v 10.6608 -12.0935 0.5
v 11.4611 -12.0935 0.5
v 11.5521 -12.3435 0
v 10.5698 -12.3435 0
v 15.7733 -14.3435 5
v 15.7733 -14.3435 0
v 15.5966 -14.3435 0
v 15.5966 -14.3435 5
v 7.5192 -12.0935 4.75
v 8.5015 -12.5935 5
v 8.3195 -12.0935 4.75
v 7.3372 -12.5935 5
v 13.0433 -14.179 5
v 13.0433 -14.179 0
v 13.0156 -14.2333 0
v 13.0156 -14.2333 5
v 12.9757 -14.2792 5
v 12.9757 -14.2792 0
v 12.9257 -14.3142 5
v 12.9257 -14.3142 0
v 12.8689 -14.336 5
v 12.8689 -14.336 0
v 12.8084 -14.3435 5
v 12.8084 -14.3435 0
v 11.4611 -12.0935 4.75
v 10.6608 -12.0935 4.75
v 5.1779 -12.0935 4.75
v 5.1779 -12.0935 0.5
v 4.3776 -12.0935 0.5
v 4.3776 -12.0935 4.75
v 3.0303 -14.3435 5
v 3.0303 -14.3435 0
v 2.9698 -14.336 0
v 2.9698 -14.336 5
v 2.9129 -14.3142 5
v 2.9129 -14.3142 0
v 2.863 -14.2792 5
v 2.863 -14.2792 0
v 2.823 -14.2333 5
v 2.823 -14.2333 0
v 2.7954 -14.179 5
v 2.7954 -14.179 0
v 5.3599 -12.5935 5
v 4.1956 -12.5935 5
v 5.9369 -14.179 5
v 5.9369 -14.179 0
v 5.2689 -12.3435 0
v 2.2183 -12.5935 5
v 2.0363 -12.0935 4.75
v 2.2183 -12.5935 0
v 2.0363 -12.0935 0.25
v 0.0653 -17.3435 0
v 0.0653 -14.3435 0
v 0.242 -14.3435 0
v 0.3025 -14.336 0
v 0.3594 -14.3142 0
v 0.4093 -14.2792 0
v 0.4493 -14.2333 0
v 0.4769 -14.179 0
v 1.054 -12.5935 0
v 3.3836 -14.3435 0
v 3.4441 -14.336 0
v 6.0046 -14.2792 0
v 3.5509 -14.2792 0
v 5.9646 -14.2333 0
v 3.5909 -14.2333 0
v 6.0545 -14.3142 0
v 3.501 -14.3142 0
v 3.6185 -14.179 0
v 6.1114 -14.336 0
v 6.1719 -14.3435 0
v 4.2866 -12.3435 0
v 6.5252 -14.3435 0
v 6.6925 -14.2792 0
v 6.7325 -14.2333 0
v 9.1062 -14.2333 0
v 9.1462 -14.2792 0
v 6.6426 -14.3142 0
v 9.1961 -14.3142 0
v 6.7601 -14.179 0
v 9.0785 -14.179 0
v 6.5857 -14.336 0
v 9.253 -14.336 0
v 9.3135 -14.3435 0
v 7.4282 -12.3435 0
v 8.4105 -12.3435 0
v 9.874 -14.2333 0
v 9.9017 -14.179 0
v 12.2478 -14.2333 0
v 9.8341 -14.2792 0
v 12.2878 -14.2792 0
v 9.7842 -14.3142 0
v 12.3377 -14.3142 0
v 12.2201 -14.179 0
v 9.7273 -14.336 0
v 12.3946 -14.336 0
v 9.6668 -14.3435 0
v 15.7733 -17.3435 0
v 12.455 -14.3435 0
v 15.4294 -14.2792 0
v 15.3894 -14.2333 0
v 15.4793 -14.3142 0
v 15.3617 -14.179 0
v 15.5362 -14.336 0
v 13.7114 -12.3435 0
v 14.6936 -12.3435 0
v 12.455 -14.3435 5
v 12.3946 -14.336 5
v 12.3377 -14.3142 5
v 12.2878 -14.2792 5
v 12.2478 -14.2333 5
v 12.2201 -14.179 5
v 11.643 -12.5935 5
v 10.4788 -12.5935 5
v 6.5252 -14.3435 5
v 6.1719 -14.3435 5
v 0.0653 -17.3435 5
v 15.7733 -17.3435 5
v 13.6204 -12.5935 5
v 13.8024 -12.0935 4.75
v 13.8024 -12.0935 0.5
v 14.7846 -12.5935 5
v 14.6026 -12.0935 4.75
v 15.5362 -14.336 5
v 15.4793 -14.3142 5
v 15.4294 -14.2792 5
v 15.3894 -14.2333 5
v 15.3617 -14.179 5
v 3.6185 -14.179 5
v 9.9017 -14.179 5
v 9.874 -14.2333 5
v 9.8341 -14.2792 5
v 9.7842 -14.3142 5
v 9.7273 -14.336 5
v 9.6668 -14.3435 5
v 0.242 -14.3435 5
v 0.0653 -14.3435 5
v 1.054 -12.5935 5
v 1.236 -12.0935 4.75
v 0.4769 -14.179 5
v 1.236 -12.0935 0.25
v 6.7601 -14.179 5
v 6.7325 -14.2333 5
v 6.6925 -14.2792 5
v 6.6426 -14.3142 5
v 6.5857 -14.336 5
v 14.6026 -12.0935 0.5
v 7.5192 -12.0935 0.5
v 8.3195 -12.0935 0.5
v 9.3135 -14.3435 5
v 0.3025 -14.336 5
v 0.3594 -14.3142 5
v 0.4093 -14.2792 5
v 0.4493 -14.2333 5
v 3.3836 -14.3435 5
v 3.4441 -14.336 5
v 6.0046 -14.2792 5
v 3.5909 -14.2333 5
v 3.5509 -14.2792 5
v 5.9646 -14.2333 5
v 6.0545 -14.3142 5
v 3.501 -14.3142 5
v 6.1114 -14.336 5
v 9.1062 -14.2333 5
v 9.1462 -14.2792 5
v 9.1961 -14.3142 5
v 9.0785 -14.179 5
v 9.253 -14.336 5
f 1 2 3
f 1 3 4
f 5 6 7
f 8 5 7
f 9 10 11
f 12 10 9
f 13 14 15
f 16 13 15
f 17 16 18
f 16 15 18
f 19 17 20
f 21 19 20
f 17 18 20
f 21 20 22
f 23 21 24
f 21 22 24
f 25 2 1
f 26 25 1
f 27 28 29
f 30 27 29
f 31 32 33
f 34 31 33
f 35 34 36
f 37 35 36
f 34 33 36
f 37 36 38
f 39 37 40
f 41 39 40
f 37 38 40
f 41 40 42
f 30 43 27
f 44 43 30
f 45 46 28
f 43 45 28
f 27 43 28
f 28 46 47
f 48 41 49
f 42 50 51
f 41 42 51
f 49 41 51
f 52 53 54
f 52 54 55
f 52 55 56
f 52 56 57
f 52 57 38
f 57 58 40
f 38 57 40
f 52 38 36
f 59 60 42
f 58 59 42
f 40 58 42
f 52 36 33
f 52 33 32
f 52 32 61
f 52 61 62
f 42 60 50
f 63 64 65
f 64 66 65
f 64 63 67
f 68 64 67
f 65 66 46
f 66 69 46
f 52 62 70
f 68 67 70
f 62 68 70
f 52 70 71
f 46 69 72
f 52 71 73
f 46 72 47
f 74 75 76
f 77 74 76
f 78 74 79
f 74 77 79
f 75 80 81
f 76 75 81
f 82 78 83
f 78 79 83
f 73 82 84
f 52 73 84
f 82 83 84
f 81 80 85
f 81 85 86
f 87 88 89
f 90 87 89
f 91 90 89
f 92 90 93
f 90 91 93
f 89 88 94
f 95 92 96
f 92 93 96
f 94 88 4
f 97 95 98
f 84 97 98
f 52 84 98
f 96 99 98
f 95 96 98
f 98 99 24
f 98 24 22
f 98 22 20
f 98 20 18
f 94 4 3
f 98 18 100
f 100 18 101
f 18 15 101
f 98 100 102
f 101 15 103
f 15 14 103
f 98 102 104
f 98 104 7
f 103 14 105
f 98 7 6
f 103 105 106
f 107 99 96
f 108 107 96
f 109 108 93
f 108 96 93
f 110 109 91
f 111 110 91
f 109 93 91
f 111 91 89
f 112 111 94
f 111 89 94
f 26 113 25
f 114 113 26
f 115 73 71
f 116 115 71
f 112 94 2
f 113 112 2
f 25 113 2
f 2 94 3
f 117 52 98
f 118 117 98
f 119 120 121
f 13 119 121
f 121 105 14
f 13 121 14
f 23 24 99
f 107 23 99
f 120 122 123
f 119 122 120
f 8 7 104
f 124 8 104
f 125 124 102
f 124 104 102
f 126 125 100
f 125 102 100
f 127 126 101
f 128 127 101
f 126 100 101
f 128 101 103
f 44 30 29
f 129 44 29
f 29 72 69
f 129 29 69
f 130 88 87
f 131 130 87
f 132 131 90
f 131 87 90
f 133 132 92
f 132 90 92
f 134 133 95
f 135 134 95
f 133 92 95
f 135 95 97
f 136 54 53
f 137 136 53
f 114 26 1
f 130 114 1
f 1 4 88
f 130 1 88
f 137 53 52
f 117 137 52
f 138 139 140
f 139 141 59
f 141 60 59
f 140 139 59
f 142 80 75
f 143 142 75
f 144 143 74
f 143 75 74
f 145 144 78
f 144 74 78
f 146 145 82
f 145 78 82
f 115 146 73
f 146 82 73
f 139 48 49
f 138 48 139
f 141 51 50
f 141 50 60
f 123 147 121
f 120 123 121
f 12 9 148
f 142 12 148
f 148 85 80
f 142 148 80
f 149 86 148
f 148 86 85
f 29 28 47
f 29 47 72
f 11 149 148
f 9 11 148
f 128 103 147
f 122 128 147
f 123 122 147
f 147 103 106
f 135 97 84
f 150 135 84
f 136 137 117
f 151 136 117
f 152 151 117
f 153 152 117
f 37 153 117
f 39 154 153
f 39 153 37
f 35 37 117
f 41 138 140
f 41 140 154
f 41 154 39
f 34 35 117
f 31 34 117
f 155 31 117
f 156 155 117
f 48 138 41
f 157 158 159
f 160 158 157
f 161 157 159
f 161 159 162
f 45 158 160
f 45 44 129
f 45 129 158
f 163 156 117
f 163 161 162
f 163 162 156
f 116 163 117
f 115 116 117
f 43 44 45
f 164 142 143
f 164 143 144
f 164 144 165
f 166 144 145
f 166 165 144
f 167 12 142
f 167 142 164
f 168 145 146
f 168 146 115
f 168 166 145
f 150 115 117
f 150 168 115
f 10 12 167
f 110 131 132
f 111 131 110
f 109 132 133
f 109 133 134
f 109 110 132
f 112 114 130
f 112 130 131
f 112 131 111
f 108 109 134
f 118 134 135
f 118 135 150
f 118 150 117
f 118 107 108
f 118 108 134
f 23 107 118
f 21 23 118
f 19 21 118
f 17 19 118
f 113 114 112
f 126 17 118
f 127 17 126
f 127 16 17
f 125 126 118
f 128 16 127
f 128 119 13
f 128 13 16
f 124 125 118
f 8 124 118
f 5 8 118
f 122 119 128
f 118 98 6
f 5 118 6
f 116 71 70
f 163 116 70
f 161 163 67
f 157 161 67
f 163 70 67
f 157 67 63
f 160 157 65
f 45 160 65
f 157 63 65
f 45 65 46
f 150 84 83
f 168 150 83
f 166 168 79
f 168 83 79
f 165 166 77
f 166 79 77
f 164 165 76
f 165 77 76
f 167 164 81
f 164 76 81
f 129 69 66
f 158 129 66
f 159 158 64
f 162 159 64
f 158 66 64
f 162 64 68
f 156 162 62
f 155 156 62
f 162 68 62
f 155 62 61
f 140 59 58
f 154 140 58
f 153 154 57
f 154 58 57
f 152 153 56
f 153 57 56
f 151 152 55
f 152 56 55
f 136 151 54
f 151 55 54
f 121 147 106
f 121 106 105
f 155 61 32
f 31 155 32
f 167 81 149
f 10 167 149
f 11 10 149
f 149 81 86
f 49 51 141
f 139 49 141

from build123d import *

# Parameters (mm, degrees)
F1_DEPTH     = 5
F2_C1_SIZE2  = 0.25
F2_C1_SIZE   = 0.5
F2_C2_SIZE2  = 0.5
F2_C2_SIZE   = 0.25
F2_C3_SIZE2  = 0.5
F2_C3_SIZE   = 0.25
F2_C4_SIZE2  = 0.5
F2_C4_SIZE   = 0.25
F2_C5_SIZE2  = 0.25
F2_C5_SIZE   = 0.5
F2_C6_SIZE2  = 0.5
F2_C6_SIZE   = 0.25
F2_C7_SIZE2  = 0.5
F2_C7_SIZE   = 0.25
F2_C8_SIZE2  = 0.5
F2_C8_SIZE   = 0.25
F2_C9_SIZE2  = 0.5
F2_C9_SIZE   = 0.25
F2_C10_SIZE2 = 0.5
F2_C10_SIZE  = 0.25


with BuildPart() as f1:
    # F0 (on Top) → F1 (new body)
    with BuildSketch(Plane.XY):
        with BuildLine():
            Line((1.236000562, -12.0934582279), (0.4769388315, -14.1789632613))
            ThreePointArc((0.4769388315, -14.1789632613), (0.3854097856, -14.2982462382), (0.2420156754, -14.3434582279))
            Line((0.2420156754, -14.3434582279), (0.065349562, -14.3434582279))
            Line((0.065349562, -14.3434582279), (0.065349562, -17.3434582279))
            Line((0.065349562, -17.3434582279), (15.773299562, -17.3434582279))
            Line((15.773299562, -17.3434582279), (15.773299562, -14.3434582279))
            Line((15.773299562, -14.3434582279), (15.5966334485, -14.3434582279))
            ThreePointArc((15.5966334485, -14.3434582279), (15.4532393383, -14.2982462382), (15.3617102924, -14.1789632613))
            Line((15.3617102924, -14.1789632613), (14.602648562, -12.0934582279))
            Line((14.602648562, -12.0934582279), (13.802360562, -12.0934582279))
            Line((13.802360562, -12.0934582279), (13.0432988315, -14.1789632613))
            ThreePointArc((13.0432988315, -14.1789632613), (12.9517697856, -14.2982462382), (12.8083756754, -14.3434582279))
            Line((12.8083756754, -14.3434582279), (12.4550434485, -14.3434582279))
            ThreePointArc((12.4550434485, -14.3434582279), (12.3116493383, -14.2982462382), (12.2201202924, -14.1789632613))
            Line((12.2201202924, -14.1789632613), (11.461058562, -12.0934582279))
            Line((11.461058562, -12.0934582279), (10.660770562, -12.0934582279))
            Line((10.660770562, -12.0934582279), (9.9017088315, -14.1789632613))
            ThreePointArc((9.9017088315, -14.1789632613), (9.8101797856, -14.2982462382), (9.6667856754, -14.3434582279))
            Line((9.6667856754, -14.3434582279), (9.3134534485, -14.3434582279))
            ThreePointArc((9.3134534485, -14.3434582279), (9.1700593383, -14.2982462382), (9.0785302924, -14.1789632613))
            Line((9.0785302924, -14.1789632613), (8.319468562, -12.0934582279))
            Line((8.319468562, -12.0934582279), (7.519180562, -12.0934582279))
            Line((7.519180562, -12.0934582279), (6.7601188315, -14.1789632613))
            ThreePointArc((6.7601188315, -14.1789632613), (6.6685897856, -14.2982462382), (6.5251956754, -14.3434582279))
            Line((6.5251956754, -14.3434582279), (6.1718634485, -14.3434582279))
            ThreePointArc((6.1718634485, -14.3434582279), (6.0284693383, -14.2982462382), (5.9369402924, -14.1789632613))
            Line((5.9369402924, -14.1789632613), (5.177878562, -12.0934582279))
            Line((5.177878562, -12.0934582279), (4.377590562, -12.0934582279))
            Line((4.377590562, -12.0934582279), (3.6185288315, -14.1789632613))
            ThreePointArc((3.6185288315, -14.1789632613), (3.5269997856, -14.2982462382), (3.3836056754, -14.3434582279))
            Line((3.3836056754, -14.3434582279), (3.0302734485, -14.3434582279))
            ThreePointArc((3.0302734485, -14.3434582279), (2.8868793383, -14.2982462382), (2.7953502924, -14.1789632613))
            Line((2.7953502924, -14.1789632613), (2.036288562, -12.0934582279))
            Line((2.036288562, -12.0934582279), (1.236000562, -12.0934582279))
        make_face()
    extrude(amount=F1_DEPTH)

    # F2: chamfer of 0.25 x 0.5 on 10 edges, made by hand

    # F2_c1
    f2_c1_edges = [f1.edges().sort_by_distance(p)[0] for p in [
        (7.919324562, -12.0934582279, 0),
    ]]
    f2_c1_side = f1.faces().sort_by_distance((7.919324562, -12.0934582279, 0.005))[0]
    chamfer(f2_c1_edges, length=F2_C1_SIZE, length2=F2_C1_SIZE2, reference=f2_c1_side)

    # F2_c2
    f2_c2_edges = [f1.edges().sort_by_distance(p)[0] for p in [
        (7.919324562, -12.0934582279, 5),
    ]]
    f2_c2_side = f1.faces().sort_by_distance((7.919324562, -12.0934582279, 4.995))[0]
    chamfer(f2_c2_edges, length=F2_C2_SIZE, length2=F2_C2_SIZE2, reference=f2_c2_side)

    # F2_c3
    f2_c3_edges = [f1.edges().sort_by_distance(p)[0] for p in [
        (4.777734562, -12.0934582279, 0),
    ]]
    f2_c3_side = f1.faces().sort_by_distance((4.777734562, -12.0984582279, 0))[0]
    chamfer(f2_c3_edges, length=F2_C3_SIZE, length2=F2_C3_SIZE2, reference=f2_c3_side)

    # F2_c4
    f2_c4_edges = [f1.edges().sort_by_distance(p)[0] for p in [
        (4.777734562, -12.0934582279, 5),
    ]]
    f2_c4_side = f1.faces().sort_by_distance((4.777734562, -12.0934582279, 4.995))[0]
    chamfer(f2_c4_edges, length=F2_C4_SIZE, length2=F2_C4_SIZE2, reference=f2_c4_side)

    # F2_c5
    f2_c5_edges = [f1.edges().sort_by_distance(p)[0] for p in [
        (1.636144562, -12.0934582279, 0),
    ]]
    f2_c5_side = f1.faces().sort_by_distance((1.636144562, -12.0984582279, 0))[0]
    chamfer(f2_c5_edges, length=F2_C5_SIZE, length2=F2_C5_SIZE2, reference=f2_c5_side)

    # F2_c6
    f2_c6_edges = [f1.edges().sort_by_distance(p)[0] for p in [
        (1.636144562, -12.0934582279, 5),
    ]]
    f2_c6_side = f1.faces().sort_by_distance((1.636144562, -12.0934582279, 4.995))[0]
    chamfer(f2_c6_edges, length=F2_C6_SIZE, length2=F2_C6_SIZE2, reference=f2_c6_side)

    # F2_c7
    f2_c7_edges = [f1.edges().sort_by_distance(p)[0] for p in [
        (14.202504562, -12.0934582279, 0),
    ]]
    f2_c7_side = f1.faces().sort_by_distance((14.202504562, -12.0984582279, 0))[0]
    chamfer(f2_c7_edges, length=F2_C7_SIZE, length2=F2_C7_SIZE2, reference=f2_c7_side)

    # F2_c8
    f2_c8_edges = [f1.edges().sort_by_distance(p)[0] for p in [
        (14.202504562, -12.0934582279, 5),
    ]]
    f2_c8_side = f1.faces().sort_by_distance((14.202504562, -12.0934582279, 4.995))[0]
    chamfer(f2_c8_edges, length=F2_C8_SIZE, length2=F2_C8_SIZE2, reference=f2_c8_side)

    # F2_c9
    f2_c9_edges = [f1.edges().sort_by_distance(p)[0] for p in [
        (11.060914562, -12.0934582279, 0),
    ]]
    f2_c9_side = f1.faces().sort_by_distance((11.060914562, -12.0984582279, 0))[0]
    chamfer(f2_c9_edges, length=F2_C9_SIZE, length2=F2_C9_SIZE2, reference=f2_c9_side)

    # F2_c10
    f2_c10_edges = [f1.edges().sort_by_distance(p)[0] for p in [
        (11.060914562, -12.0934582279, 5),
    ]]
    f2_c10_side = f1.faces().sort_by_distance((11.060914562, -12.0934582279, 4.995))[0]
    chamfer(f2_c10_edges, length=F2_C10_SIZE, length2=F2_C10_SIZE2, reference=f2_c10_side)


solid = f1.part
